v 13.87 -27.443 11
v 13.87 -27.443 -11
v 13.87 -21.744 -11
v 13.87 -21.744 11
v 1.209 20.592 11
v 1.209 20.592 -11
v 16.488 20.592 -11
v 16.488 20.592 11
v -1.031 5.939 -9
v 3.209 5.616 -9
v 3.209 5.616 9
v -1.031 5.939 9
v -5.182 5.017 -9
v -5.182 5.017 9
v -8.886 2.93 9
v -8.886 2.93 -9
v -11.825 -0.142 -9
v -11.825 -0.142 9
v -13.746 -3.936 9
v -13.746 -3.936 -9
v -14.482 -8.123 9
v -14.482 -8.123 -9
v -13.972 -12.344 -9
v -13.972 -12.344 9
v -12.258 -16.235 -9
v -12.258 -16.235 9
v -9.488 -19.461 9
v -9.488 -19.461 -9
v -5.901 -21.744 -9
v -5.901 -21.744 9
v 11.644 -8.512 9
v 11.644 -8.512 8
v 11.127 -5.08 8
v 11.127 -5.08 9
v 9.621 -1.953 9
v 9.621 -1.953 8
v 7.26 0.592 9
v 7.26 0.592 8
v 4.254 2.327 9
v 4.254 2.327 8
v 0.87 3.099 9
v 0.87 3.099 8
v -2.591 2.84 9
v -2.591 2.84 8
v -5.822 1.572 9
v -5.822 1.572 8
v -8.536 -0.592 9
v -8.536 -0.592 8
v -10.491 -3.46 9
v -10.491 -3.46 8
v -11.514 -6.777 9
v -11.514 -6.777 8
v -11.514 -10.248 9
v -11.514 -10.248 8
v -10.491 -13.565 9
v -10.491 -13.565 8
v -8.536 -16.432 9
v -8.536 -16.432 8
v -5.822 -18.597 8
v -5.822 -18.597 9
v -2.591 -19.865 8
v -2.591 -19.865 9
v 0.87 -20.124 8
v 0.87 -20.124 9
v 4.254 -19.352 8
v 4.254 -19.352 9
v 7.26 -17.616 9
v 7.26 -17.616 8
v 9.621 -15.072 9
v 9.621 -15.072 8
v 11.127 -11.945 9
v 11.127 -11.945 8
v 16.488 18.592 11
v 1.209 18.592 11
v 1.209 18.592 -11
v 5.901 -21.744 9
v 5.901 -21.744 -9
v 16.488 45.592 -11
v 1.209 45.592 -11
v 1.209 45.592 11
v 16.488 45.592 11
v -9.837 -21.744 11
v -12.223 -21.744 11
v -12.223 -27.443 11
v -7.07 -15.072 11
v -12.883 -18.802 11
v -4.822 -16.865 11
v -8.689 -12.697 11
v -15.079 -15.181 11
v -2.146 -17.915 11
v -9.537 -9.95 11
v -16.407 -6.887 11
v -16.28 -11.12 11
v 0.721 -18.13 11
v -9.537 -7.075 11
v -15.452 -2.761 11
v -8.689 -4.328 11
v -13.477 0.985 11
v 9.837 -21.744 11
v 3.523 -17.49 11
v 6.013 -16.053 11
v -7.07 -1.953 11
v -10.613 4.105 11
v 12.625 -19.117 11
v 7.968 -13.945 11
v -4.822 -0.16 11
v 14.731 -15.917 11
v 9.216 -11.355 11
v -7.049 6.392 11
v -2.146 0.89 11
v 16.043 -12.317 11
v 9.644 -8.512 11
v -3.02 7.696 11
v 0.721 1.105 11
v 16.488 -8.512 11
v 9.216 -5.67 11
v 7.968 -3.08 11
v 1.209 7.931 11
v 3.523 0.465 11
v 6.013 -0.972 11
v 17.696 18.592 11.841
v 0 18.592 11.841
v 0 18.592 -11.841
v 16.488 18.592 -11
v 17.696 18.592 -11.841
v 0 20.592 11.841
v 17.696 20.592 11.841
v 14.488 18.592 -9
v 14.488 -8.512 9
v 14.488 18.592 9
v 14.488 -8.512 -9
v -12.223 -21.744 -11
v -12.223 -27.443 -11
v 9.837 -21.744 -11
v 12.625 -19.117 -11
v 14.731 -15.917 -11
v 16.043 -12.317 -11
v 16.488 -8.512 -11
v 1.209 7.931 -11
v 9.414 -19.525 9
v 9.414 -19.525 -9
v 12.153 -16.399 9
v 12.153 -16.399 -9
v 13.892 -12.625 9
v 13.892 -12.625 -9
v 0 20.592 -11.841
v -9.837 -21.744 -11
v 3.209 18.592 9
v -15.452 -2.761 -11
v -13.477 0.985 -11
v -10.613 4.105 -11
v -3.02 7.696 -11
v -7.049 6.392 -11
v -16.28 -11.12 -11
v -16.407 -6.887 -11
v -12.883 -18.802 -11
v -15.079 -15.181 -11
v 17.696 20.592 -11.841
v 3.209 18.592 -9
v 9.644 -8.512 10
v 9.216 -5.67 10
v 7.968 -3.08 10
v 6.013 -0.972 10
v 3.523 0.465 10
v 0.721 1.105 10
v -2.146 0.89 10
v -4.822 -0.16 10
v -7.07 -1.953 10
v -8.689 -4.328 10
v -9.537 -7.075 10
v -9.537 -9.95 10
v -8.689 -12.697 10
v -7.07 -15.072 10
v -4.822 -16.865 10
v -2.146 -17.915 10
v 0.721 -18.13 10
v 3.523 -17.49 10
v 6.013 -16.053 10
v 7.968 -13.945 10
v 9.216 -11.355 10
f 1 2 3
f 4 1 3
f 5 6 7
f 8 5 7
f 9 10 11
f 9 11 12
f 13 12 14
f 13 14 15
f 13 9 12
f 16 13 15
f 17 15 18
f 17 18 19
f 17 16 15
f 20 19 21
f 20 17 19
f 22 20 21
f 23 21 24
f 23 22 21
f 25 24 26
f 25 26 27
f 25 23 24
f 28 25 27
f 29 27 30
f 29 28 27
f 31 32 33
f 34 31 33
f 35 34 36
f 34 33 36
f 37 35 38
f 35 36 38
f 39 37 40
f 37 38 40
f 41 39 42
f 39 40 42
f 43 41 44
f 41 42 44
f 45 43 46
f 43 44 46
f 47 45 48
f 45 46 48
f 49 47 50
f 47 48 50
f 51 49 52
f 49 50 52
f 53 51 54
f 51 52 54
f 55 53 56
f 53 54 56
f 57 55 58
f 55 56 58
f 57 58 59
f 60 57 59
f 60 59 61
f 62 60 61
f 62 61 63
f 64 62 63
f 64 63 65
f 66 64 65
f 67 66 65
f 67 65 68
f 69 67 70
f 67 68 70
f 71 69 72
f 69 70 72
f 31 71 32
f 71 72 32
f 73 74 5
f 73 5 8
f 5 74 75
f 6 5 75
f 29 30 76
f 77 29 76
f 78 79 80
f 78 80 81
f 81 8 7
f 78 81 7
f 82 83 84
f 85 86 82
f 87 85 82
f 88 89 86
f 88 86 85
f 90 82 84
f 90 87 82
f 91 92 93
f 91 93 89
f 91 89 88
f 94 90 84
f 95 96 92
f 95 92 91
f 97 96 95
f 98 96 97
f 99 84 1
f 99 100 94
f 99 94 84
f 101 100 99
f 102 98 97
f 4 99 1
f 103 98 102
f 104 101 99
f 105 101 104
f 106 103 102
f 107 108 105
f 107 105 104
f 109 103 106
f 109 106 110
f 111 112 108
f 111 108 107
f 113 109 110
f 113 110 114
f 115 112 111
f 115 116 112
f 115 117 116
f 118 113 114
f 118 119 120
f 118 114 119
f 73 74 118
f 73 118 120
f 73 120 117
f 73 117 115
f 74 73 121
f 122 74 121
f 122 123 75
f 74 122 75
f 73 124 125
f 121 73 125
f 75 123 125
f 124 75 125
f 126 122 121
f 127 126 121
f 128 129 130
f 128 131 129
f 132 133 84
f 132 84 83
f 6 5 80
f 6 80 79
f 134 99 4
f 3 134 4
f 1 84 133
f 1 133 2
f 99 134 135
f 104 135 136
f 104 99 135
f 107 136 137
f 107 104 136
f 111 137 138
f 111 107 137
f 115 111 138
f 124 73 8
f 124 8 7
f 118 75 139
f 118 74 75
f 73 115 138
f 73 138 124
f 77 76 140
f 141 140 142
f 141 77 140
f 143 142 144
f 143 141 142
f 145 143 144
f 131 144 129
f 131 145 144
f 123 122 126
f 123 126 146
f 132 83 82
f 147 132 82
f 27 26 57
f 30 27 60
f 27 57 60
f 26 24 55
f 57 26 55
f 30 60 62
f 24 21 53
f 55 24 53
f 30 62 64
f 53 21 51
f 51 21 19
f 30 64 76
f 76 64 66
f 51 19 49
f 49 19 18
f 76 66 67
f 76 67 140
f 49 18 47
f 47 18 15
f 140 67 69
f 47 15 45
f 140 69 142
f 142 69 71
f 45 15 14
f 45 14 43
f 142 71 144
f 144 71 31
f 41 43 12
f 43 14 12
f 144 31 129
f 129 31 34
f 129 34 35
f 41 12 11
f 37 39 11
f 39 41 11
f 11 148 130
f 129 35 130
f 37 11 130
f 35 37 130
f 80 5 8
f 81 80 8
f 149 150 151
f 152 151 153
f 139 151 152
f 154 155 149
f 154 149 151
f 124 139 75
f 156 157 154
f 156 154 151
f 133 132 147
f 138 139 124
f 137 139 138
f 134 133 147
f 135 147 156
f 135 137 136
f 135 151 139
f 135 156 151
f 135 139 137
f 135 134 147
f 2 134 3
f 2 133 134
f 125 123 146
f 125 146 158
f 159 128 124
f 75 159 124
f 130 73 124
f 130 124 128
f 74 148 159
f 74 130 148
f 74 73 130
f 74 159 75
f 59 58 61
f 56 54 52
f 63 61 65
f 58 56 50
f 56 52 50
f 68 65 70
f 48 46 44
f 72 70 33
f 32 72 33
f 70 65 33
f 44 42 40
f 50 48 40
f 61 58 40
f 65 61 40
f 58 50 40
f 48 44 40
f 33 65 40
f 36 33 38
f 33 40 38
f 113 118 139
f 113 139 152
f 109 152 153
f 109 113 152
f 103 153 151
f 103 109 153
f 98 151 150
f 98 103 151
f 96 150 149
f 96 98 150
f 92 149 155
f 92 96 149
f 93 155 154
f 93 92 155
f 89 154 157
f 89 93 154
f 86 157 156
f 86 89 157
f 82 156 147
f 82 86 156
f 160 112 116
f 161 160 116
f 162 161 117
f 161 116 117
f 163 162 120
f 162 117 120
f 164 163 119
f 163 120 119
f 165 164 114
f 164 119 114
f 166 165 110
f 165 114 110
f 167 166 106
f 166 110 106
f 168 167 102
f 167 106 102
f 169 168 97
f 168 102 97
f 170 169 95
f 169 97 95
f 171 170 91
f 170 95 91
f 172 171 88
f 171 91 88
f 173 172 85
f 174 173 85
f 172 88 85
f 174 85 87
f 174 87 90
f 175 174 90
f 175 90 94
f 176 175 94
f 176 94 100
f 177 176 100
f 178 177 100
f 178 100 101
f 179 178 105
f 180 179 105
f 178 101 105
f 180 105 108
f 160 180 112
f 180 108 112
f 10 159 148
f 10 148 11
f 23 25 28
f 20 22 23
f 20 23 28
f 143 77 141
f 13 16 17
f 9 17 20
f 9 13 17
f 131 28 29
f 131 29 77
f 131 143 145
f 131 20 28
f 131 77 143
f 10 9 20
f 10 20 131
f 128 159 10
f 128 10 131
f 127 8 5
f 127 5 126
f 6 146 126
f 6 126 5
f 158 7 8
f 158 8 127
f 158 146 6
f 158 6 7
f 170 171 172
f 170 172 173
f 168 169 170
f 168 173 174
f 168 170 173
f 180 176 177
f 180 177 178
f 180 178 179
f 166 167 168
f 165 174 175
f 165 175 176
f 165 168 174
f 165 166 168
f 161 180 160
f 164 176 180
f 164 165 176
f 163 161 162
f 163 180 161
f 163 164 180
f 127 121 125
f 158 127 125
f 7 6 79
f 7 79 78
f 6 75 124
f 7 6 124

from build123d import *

# Parameters (mm, degrees)
BOSS_EXTRUDE1_DEPTH = 11
SKETCH2_R           = 9.644275983
CUT_EXTRUDE1_DEPTH  = 1
SHELL1_START        = -9
SHELL1_DEPTH        = 17
SHELL1_START_2      = 8
SHELL1_2_OUTLINE_R  = 11.644275983
SHELL1_2_DEPTH      = 1
BOSS_EXTRUDE2_REACH = 39.16
SKETCH3_W           = 26.092999246
SKETCH3_H           = 5.699260362
SKETCH4_W           = 17.696218594
SKETCH4_H           = 23.681228884
SKETCH4_W_2         = 15.279066264
SKETCH4_H_2         = 22
BOSS_EXTRUDE3_DEPTH = 2
SKETCH5_W           = 15.279066264
SKETCH5_H           = 22
BOSS_EXTRUDE4_DEPTH = 25


# Read off the part's stored shape, not the designer's step: Shell1
with BuildPart() as part:
    # Sketch1 → Boss-Extrude1 (new, symmetric)
    with BuildSketch(Plane.XY):
        with BuildLine():
            Line((1.208576165, 18.591616866), (1.208576165, 7.930929707))
            ThreePointArc((1.208576165, 7.930929707), (-12.078264042, -19.735453873), (16.487642429, -8.512357571))
            Line((16.487642429, -8.512357571), (16.487642429, 18.591616866))
            Line((16.487642429, 18.591616866), (1.208576165, 18.591616866))
        make_face()
    extrude(amount=BOSS_EXTRUDE1_DEPTH, both=True)

    # Sketch2 → Cut-Extrude1 (cut)
    with BuildSketch(Plane.XY.offset(11)):
        with Locations((0, -8.512357571)):
            Circle(SKETCH2_R)
    extrude(amount=-CUT_EXTRUDE1_DEPTH, mode=Mode.SUBTRACT)

    # Shell1 outline → Shell1 (cut)
    with BuildSketch(Plane.XY.offset(SHELL1_START)):
        with BuildLine():
            Line((3.208576165, 18.591616866), (3.208576165, 5.615516371))
            ThreePointArc((3.208576165, 5.615516371), (-11.322024715, -17.551358594), (14.487642429, -8.512357571))
            Line((14.487642429, -8.512357571), (14.487642429, 18.591616866))
            Line((14.487642429, 18.591616866), (3.208576165, 18.591616866))
        make_face()
    extrude(amount=SHELL1_DEPTH, mode=Mode.SUBTRACT)

    # Shell1 2 outline → Shell1 2 (cut)
    with BuildSketch(Plane.XY.offset(SHELL1_START_2)):
        with BuildLine():
            Line((3.208576165, 18.591616866), (3.208576165, 5.615516371))
            ThreePointArc((3.208576165, 5.615516371), (-11.322024715, -17.551358594), (14.487642429, -8.512357571))
            Line((14.487642429, -8.512357571), (14.487642429, 18.591616866))
            Line((14.487642429, 18.591616866), (3.208576165, 18.591616866))
        make_face()
        with Locations((0, -8.512357571)):
            Circle(SHELL1_2_OUTLINE_R, mode=Mode.SUBTRACT)
    extrude(amount=SHELL1_2_DEPTH, mode=Mode.SUBTRACT)

    # Boss-Extrude2: up to this face of the body (flat: up to its plane)
    boss_extrude2_end = Plane(part.part.faces().sort_by_distance((2.030831777, -4.5272693, -11))[0])
    # Sketch3 → Boss-Extrude2 (add, up to the picked face)
    with BuildSketch(Plane.XY.offset(11), mode=Mode.PRIVATE) as boss_extrude2_sk1:
        with Locations((0.82398945, -24.59358437)):
            Rectangle(SKETCH3_W, SKETCH3_H)
    boss_extrude2_tool1 = split(extrude(boss_extrude2_sk1.sketch, amount=-BOSS_EXTRUDE2_REACH, mode=Mode.PRIVATE), bisect_by=boss_extrude2_end, keep=Keep.BOTH, mode=Mode.PRIVATE)
    add(boss_extrude2_tool1.solids().sort_by(Axis((0.823989, -24.593584, 11), (0, 0, -1)))[0])


with BuildPart() as body_2:
    # Sketch4 → Boss-Extrude3 (new body)
    with BuildSketch(Plane(origin=(0, 18.591616866, 0), x_dir=(1, 0, 0), z_dir=(0, 1, 0))):
        with Locations((8.848109297, 0)):
            Rectangle(SKETCH4_W, SKETCH4_H)
        with Locations((8.848109297, 0)):
            Rectangle(SKETCH4_W_2, SKETCH4_H_2, mode=Mode.SUBTRACT)
    extrude(amount=BOSS_EXTRUDE3_DEPTH)


with BuildPart() as body_3:
    # Sketch5 → Boss-Extrude4 (new body)
    with BuildSketch(Plane(origin=(0, 20.591616866, 0), x_dir=(1, 0, 0), z_dir=(0, 1, 0))):
        with Locations((8.848109297, 0)):
            Rectangle(SKETCH5_W, SKETCH5_H)
    extrude(amount=BOSS_EXTRUDE4_DEPTH)


solid = Compound([part.part, body_2.part, body_3.part])
